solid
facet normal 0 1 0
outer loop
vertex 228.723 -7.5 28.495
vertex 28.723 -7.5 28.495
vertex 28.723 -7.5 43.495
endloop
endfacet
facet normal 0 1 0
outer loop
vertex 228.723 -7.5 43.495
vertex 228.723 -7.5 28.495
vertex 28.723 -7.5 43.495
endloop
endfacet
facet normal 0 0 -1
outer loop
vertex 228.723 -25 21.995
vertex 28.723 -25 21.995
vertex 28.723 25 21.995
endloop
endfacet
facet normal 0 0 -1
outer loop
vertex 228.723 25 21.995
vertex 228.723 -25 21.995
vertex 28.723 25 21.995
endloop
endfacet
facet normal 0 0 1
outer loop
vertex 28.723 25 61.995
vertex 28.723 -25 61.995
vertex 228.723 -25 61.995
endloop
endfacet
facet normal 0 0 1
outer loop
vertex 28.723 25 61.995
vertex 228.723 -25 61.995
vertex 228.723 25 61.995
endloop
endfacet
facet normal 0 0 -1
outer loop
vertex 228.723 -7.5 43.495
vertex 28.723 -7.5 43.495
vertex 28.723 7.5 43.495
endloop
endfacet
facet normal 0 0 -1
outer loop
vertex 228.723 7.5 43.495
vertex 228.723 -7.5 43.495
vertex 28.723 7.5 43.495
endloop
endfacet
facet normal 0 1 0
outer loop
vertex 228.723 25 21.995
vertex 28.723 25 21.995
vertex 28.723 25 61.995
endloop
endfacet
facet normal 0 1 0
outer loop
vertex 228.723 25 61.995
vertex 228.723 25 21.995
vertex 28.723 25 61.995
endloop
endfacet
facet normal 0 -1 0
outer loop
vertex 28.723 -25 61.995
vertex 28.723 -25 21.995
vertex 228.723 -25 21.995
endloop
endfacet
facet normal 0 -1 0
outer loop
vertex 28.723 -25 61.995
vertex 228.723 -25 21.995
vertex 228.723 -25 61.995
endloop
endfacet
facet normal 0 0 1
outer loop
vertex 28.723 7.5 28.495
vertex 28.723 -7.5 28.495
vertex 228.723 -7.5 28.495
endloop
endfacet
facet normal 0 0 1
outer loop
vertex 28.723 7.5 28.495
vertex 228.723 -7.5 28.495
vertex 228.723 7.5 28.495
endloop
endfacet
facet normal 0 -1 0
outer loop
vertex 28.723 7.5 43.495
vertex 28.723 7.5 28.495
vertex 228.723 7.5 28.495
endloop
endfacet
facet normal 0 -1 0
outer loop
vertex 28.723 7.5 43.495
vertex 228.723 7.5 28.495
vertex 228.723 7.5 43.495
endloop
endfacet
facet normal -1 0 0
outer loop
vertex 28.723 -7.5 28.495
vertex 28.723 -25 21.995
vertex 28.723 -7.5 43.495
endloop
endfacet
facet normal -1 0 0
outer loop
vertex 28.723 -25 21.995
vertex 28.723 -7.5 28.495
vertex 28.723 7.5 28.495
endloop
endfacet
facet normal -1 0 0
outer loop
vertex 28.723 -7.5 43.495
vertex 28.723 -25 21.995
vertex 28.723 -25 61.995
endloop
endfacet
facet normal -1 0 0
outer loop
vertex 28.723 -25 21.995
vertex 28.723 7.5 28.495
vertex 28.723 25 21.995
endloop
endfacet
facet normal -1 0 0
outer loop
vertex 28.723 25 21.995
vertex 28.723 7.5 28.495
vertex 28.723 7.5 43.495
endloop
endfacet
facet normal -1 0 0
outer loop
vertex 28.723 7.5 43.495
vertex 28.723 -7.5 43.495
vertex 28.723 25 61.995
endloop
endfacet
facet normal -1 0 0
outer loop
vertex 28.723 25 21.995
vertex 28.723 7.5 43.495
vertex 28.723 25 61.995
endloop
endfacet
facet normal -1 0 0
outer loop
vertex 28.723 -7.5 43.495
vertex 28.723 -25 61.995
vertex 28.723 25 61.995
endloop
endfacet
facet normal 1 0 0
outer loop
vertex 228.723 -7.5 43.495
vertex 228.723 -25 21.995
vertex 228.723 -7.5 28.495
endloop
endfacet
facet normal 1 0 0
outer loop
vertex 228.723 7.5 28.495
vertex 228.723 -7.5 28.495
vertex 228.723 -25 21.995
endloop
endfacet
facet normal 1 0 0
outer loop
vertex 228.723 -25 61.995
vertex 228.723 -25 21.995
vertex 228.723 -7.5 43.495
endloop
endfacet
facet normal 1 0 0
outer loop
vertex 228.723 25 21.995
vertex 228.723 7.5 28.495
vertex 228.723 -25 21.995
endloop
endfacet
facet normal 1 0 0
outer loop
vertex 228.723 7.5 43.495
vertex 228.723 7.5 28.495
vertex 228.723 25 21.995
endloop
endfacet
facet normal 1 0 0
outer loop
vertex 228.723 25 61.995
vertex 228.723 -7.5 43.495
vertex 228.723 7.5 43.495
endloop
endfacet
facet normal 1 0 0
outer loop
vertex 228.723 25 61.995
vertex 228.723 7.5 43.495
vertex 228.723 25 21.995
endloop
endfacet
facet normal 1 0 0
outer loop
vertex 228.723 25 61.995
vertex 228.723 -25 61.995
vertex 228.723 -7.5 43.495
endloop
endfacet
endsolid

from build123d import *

# Parameters (mm, degrees)
SKETCH015_W   = 50
SKETCH015_H   = 40
SKETCH015_W_2 = 15
SKETCH015_H_2 = 15
PAD008_DEPTH  = 200


with BuildPart() as part:
    # Sketch015 → Pad008 (new body)
    with BuildSketch(Plane.YZ):
        with Locations((0, -0.005687)):
            Rectangle(SKETCH015_W, SKETCH015_H)
        with Locations((0, -6.005687)):
            Rectangle(SKETCH015_W_2, SKETCH015_H_2, mode=Mode.SUBTRACT)
    extrude(amount=PAD008_DEPTH)


with BuildPart() as part_1:
    # Body004 placement: moved
    add(part.part.moved(Location((28.722813, 0, 42.00053))))


solid = part_1.part
